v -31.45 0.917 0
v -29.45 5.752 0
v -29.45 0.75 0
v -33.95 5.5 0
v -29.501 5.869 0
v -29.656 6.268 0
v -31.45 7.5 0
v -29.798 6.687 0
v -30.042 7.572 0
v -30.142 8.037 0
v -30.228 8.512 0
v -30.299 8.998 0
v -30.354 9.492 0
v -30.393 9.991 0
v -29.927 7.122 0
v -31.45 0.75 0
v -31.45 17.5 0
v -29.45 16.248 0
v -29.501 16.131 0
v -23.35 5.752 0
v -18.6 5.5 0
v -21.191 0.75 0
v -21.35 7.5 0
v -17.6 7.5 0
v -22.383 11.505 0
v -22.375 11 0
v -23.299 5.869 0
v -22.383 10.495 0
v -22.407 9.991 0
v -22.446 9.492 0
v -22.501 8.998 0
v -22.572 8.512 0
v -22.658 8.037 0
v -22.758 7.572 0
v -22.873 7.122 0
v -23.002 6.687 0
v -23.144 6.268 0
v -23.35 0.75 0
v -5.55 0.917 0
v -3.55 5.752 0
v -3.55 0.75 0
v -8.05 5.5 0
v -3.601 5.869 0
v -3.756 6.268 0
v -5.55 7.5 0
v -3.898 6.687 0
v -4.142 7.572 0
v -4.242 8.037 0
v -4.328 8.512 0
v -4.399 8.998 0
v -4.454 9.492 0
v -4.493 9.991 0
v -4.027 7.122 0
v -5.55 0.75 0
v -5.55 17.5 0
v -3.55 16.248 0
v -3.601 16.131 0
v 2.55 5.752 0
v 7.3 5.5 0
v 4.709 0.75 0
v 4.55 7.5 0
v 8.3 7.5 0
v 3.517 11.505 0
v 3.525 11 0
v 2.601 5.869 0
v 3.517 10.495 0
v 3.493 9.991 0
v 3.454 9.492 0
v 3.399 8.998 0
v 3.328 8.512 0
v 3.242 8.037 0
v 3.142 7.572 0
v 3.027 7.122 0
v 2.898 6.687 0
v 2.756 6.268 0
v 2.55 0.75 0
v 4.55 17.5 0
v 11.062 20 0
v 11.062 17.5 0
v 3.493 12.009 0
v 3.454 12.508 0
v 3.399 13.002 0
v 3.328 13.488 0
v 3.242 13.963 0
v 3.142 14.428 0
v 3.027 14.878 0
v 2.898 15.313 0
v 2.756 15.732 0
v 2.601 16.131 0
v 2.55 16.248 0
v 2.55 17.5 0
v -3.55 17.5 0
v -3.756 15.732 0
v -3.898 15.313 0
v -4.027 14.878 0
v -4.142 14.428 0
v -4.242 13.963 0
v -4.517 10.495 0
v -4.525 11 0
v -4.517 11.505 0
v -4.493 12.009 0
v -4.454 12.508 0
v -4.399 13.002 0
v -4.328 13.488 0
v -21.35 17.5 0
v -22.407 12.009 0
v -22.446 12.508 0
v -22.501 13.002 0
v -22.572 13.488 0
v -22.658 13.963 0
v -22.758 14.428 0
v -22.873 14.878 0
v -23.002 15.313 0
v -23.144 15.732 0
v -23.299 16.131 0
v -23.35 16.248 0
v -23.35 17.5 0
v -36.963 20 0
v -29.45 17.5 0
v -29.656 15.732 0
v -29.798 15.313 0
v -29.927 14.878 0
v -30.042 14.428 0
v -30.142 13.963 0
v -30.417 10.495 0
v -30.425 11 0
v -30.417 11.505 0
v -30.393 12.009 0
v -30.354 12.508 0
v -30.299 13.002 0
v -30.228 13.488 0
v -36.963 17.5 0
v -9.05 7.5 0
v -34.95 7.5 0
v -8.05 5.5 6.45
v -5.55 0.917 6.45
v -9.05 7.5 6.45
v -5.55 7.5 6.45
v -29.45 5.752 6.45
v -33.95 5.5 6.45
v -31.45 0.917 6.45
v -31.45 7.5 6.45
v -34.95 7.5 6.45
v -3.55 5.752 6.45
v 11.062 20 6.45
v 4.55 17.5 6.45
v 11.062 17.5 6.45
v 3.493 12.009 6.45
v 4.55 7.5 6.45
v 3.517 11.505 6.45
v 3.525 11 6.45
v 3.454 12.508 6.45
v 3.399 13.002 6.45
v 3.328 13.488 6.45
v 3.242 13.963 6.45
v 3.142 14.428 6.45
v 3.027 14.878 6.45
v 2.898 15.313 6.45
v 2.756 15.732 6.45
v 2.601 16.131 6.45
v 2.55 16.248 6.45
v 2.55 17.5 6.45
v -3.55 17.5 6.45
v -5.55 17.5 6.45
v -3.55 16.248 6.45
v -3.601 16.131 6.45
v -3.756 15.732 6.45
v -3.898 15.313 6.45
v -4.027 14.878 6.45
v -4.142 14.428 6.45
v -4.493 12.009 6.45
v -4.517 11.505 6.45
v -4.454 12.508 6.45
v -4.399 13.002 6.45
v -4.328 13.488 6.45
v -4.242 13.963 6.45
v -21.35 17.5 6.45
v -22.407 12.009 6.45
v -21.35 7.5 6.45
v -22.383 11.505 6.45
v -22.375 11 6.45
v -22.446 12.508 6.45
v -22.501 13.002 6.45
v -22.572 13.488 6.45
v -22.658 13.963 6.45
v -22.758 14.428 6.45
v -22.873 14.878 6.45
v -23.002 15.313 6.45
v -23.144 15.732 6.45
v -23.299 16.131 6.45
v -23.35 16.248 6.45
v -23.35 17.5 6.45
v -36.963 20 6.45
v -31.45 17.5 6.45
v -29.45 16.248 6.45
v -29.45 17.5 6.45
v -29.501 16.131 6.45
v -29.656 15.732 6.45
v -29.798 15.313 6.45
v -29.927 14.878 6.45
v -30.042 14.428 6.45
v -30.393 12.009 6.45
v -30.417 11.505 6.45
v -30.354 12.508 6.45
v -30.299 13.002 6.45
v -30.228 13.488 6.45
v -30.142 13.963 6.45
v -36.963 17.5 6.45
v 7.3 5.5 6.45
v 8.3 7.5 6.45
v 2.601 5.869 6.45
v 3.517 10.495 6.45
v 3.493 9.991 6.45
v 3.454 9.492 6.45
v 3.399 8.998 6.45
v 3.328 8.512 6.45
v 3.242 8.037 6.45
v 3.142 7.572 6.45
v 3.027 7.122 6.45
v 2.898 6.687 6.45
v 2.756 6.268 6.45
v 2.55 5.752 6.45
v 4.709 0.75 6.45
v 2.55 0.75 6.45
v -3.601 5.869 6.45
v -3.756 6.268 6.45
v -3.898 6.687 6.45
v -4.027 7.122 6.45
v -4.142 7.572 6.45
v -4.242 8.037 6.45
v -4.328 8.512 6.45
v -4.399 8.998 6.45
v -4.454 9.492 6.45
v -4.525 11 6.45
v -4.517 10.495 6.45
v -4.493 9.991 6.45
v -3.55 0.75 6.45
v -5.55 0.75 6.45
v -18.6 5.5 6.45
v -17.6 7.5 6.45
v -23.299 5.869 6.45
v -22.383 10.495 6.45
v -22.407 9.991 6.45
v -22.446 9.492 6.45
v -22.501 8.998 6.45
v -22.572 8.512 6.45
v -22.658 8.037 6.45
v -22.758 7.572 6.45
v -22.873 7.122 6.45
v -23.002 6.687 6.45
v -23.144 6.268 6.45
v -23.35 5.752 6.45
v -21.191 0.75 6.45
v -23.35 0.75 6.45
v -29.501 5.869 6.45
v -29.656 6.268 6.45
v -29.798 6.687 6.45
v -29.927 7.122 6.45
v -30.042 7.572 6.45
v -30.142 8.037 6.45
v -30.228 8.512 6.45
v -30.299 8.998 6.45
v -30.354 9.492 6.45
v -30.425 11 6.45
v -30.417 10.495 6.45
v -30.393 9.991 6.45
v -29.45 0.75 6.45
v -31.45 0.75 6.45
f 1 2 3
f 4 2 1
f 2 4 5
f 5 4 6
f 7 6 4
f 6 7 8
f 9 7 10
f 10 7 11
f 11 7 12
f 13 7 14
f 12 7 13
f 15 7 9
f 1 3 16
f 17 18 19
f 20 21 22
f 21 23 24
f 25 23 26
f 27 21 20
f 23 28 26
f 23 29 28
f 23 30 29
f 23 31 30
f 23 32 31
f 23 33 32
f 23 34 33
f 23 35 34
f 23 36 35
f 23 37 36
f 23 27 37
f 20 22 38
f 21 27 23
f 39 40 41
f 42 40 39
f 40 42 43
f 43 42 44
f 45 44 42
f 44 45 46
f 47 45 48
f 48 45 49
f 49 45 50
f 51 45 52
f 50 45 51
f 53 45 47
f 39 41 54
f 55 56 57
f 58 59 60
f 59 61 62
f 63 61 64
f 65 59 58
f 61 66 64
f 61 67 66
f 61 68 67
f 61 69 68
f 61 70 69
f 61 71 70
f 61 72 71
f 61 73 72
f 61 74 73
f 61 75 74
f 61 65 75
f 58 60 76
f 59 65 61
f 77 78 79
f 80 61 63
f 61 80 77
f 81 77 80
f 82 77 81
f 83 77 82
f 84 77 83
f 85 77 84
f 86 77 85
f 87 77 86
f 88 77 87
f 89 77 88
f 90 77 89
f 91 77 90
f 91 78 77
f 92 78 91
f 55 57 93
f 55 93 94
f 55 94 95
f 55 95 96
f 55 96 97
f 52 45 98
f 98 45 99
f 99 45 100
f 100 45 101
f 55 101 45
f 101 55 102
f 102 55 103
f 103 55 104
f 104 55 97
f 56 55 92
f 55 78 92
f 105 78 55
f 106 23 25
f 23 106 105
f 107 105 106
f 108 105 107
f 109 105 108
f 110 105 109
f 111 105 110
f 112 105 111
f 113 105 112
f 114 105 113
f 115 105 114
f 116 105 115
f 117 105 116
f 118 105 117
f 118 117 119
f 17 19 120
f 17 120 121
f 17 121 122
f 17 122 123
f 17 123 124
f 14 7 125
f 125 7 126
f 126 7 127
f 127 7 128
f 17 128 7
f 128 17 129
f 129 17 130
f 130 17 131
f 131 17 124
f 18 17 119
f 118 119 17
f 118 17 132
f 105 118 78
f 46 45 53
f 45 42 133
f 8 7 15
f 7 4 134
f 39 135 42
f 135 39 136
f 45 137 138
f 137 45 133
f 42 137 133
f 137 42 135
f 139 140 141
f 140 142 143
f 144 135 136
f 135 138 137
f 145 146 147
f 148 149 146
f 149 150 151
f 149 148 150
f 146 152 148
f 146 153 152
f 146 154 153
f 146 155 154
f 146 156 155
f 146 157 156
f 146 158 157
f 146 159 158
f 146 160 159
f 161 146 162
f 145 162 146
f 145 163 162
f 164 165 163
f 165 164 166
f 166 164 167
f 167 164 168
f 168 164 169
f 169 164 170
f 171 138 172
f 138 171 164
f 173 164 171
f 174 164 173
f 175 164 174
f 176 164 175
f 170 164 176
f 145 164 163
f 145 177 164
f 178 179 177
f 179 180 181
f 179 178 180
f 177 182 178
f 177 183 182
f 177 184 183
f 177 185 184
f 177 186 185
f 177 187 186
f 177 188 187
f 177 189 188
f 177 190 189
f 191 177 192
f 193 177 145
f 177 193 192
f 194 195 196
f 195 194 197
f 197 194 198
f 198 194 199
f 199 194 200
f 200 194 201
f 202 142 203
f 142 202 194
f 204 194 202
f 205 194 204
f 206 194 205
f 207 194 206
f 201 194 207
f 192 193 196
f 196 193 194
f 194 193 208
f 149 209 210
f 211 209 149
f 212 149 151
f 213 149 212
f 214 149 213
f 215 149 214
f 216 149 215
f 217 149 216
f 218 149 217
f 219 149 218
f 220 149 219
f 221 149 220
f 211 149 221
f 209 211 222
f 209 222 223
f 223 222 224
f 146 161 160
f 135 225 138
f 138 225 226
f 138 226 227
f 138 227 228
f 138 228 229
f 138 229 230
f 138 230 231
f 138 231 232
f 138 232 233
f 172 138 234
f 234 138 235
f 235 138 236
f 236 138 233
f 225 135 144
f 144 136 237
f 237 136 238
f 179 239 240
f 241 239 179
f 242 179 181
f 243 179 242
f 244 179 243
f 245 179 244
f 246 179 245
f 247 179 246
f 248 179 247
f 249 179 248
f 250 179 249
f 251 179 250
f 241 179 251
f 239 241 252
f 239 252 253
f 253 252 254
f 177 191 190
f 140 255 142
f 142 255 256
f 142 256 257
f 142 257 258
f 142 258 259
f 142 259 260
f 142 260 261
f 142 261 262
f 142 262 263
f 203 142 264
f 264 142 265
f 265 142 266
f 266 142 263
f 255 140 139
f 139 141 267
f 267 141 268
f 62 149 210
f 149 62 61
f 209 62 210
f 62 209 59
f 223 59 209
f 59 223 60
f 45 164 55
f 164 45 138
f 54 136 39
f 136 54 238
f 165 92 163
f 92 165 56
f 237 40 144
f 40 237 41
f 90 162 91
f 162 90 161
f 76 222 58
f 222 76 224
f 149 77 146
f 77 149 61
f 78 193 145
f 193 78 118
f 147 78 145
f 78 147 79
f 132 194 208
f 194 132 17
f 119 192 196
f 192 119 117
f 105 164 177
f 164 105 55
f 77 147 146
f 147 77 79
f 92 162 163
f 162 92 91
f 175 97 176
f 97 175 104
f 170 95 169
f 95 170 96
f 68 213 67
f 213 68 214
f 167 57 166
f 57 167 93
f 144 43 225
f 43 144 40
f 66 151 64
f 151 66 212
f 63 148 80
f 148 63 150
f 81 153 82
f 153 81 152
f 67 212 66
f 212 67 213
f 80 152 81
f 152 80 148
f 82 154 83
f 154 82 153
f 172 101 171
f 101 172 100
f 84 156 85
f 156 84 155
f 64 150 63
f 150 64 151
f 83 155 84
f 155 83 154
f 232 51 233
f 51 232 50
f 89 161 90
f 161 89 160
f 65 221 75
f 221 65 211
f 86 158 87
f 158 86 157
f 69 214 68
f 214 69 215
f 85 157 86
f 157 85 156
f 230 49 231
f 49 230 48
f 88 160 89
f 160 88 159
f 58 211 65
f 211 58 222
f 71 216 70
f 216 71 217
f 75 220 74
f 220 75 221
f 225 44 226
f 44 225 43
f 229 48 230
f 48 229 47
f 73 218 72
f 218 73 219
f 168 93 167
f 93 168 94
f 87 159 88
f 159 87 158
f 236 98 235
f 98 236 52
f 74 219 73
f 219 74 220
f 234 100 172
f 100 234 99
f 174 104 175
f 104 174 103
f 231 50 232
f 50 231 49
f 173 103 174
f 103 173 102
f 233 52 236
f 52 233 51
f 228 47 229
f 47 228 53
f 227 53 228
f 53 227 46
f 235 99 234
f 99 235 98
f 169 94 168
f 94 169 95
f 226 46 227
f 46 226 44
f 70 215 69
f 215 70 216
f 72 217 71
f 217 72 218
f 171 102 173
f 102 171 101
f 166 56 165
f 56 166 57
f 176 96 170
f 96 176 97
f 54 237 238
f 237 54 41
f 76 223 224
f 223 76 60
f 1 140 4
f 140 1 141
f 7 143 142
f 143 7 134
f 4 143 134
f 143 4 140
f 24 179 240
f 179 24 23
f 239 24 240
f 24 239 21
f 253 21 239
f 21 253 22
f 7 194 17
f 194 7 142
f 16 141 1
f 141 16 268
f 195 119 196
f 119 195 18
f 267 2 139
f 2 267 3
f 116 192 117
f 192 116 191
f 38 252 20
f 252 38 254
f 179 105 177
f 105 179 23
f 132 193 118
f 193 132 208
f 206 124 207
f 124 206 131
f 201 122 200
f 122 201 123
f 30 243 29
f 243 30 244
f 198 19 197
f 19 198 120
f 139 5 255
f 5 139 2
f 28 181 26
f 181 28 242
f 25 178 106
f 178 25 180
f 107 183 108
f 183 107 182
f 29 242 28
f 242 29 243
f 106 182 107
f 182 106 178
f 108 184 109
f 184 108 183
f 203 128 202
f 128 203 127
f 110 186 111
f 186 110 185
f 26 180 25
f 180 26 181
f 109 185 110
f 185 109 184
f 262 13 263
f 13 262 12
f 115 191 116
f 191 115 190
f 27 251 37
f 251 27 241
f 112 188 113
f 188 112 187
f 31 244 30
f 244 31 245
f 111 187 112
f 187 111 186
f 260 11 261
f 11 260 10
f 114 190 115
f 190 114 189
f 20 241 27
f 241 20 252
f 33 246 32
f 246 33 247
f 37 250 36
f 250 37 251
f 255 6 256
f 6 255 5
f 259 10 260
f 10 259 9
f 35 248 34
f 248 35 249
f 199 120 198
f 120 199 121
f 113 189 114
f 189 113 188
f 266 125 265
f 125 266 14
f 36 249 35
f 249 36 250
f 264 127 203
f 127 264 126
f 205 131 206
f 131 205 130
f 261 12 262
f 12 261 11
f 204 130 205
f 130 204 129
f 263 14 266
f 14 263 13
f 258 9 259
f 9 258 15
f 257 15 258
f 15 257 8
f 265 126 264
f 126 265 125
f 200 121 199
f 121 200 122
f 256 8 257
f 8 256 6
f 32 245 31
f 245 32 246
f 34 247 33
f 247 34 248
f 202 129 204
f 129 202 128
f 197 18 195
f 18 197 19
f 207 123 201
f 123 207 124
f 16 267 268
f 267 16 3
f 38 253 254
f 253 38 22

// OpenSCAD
// file: config.scad
HEX_WIDTH= 125;
HEX_BORDER = 7;
HEX_HEIGHT = 38;
HEX_ARM = HEX_WIDTH / 6;
SHIELD_THICKNESS = 3;
SHIELD_DIFFUSER_PADDING = 4;

SNAPFIT_DEPTH = 12.5;
SNAPFIT_HEIGHT = 7.5;
// main file
    include <config.scad>

// Shape
distance_x = 16.1;//HEX_BORDER * 2 - 6;
distance_y = 18;

// snapfit
width = 4;
SNAPFIT_DEPTH = 6.45;
tol = .5;
module snapfit() {
    color("blue")
    linear_extrude(SNAPFIT_DEPTH)
    rotate(180)
    mirror([1,0,0])
    translate([-width,-SNAPFIT_HEIGHT,0])
    polygon([
        [0,0],
        [width, 0],
        [width-1, 2],
        [0, SNAPFIT_HEIGHT],
        [0, 0],
    ]);
}


module assembly() {
    translate([-distance_x / 2, 0, 0])
    difference() {
        union() {
            translate([-tol-.5, 0, 0])
            mirror([1,0,0])
            snapfit();

            translate([distance_x + tol - .25, 0, 0])
            mirror([0,0,0])
            snapfit();
            
            color("red")
            linear_extrude(SNAPFIT_DEPTH)
            translate([width - 1.5, 0, 0])
            square([2, distance_y]);
            
            color("red")
            linear_extrude(SNAPFIT_DEPTH)
            translate([distance_x - width - 1.5 , 0, 0])
            square([2, distance_y]);
            
            color("purple")
            linear_extrude(SNAPFIT_DEPTH)
            translate([(distance_x)/2, distance_y + .75, 0])
            square([2+distance_x*1.25, 2.5], center=true);
        }
        
        linear_extrude(SNAPFIT_DEPTH+1)
        translate([distance_x/2-.5,2 + distance_y/2,0])
        scale([1.0,2.0,3.0]) 
        circle(d=distance_x/2, $fn = 100);
        
        linear_extrude(10)
        square([200, .75], center=false);

    }
}

assembly();

translate([-42+distance_x,0,0])
assembly();

translate([-distance_x+2.5,distance_y+.75,0])
linear_extrude(SNAPFIT_DEPTH)
square([45.5,2.5], center=true);
